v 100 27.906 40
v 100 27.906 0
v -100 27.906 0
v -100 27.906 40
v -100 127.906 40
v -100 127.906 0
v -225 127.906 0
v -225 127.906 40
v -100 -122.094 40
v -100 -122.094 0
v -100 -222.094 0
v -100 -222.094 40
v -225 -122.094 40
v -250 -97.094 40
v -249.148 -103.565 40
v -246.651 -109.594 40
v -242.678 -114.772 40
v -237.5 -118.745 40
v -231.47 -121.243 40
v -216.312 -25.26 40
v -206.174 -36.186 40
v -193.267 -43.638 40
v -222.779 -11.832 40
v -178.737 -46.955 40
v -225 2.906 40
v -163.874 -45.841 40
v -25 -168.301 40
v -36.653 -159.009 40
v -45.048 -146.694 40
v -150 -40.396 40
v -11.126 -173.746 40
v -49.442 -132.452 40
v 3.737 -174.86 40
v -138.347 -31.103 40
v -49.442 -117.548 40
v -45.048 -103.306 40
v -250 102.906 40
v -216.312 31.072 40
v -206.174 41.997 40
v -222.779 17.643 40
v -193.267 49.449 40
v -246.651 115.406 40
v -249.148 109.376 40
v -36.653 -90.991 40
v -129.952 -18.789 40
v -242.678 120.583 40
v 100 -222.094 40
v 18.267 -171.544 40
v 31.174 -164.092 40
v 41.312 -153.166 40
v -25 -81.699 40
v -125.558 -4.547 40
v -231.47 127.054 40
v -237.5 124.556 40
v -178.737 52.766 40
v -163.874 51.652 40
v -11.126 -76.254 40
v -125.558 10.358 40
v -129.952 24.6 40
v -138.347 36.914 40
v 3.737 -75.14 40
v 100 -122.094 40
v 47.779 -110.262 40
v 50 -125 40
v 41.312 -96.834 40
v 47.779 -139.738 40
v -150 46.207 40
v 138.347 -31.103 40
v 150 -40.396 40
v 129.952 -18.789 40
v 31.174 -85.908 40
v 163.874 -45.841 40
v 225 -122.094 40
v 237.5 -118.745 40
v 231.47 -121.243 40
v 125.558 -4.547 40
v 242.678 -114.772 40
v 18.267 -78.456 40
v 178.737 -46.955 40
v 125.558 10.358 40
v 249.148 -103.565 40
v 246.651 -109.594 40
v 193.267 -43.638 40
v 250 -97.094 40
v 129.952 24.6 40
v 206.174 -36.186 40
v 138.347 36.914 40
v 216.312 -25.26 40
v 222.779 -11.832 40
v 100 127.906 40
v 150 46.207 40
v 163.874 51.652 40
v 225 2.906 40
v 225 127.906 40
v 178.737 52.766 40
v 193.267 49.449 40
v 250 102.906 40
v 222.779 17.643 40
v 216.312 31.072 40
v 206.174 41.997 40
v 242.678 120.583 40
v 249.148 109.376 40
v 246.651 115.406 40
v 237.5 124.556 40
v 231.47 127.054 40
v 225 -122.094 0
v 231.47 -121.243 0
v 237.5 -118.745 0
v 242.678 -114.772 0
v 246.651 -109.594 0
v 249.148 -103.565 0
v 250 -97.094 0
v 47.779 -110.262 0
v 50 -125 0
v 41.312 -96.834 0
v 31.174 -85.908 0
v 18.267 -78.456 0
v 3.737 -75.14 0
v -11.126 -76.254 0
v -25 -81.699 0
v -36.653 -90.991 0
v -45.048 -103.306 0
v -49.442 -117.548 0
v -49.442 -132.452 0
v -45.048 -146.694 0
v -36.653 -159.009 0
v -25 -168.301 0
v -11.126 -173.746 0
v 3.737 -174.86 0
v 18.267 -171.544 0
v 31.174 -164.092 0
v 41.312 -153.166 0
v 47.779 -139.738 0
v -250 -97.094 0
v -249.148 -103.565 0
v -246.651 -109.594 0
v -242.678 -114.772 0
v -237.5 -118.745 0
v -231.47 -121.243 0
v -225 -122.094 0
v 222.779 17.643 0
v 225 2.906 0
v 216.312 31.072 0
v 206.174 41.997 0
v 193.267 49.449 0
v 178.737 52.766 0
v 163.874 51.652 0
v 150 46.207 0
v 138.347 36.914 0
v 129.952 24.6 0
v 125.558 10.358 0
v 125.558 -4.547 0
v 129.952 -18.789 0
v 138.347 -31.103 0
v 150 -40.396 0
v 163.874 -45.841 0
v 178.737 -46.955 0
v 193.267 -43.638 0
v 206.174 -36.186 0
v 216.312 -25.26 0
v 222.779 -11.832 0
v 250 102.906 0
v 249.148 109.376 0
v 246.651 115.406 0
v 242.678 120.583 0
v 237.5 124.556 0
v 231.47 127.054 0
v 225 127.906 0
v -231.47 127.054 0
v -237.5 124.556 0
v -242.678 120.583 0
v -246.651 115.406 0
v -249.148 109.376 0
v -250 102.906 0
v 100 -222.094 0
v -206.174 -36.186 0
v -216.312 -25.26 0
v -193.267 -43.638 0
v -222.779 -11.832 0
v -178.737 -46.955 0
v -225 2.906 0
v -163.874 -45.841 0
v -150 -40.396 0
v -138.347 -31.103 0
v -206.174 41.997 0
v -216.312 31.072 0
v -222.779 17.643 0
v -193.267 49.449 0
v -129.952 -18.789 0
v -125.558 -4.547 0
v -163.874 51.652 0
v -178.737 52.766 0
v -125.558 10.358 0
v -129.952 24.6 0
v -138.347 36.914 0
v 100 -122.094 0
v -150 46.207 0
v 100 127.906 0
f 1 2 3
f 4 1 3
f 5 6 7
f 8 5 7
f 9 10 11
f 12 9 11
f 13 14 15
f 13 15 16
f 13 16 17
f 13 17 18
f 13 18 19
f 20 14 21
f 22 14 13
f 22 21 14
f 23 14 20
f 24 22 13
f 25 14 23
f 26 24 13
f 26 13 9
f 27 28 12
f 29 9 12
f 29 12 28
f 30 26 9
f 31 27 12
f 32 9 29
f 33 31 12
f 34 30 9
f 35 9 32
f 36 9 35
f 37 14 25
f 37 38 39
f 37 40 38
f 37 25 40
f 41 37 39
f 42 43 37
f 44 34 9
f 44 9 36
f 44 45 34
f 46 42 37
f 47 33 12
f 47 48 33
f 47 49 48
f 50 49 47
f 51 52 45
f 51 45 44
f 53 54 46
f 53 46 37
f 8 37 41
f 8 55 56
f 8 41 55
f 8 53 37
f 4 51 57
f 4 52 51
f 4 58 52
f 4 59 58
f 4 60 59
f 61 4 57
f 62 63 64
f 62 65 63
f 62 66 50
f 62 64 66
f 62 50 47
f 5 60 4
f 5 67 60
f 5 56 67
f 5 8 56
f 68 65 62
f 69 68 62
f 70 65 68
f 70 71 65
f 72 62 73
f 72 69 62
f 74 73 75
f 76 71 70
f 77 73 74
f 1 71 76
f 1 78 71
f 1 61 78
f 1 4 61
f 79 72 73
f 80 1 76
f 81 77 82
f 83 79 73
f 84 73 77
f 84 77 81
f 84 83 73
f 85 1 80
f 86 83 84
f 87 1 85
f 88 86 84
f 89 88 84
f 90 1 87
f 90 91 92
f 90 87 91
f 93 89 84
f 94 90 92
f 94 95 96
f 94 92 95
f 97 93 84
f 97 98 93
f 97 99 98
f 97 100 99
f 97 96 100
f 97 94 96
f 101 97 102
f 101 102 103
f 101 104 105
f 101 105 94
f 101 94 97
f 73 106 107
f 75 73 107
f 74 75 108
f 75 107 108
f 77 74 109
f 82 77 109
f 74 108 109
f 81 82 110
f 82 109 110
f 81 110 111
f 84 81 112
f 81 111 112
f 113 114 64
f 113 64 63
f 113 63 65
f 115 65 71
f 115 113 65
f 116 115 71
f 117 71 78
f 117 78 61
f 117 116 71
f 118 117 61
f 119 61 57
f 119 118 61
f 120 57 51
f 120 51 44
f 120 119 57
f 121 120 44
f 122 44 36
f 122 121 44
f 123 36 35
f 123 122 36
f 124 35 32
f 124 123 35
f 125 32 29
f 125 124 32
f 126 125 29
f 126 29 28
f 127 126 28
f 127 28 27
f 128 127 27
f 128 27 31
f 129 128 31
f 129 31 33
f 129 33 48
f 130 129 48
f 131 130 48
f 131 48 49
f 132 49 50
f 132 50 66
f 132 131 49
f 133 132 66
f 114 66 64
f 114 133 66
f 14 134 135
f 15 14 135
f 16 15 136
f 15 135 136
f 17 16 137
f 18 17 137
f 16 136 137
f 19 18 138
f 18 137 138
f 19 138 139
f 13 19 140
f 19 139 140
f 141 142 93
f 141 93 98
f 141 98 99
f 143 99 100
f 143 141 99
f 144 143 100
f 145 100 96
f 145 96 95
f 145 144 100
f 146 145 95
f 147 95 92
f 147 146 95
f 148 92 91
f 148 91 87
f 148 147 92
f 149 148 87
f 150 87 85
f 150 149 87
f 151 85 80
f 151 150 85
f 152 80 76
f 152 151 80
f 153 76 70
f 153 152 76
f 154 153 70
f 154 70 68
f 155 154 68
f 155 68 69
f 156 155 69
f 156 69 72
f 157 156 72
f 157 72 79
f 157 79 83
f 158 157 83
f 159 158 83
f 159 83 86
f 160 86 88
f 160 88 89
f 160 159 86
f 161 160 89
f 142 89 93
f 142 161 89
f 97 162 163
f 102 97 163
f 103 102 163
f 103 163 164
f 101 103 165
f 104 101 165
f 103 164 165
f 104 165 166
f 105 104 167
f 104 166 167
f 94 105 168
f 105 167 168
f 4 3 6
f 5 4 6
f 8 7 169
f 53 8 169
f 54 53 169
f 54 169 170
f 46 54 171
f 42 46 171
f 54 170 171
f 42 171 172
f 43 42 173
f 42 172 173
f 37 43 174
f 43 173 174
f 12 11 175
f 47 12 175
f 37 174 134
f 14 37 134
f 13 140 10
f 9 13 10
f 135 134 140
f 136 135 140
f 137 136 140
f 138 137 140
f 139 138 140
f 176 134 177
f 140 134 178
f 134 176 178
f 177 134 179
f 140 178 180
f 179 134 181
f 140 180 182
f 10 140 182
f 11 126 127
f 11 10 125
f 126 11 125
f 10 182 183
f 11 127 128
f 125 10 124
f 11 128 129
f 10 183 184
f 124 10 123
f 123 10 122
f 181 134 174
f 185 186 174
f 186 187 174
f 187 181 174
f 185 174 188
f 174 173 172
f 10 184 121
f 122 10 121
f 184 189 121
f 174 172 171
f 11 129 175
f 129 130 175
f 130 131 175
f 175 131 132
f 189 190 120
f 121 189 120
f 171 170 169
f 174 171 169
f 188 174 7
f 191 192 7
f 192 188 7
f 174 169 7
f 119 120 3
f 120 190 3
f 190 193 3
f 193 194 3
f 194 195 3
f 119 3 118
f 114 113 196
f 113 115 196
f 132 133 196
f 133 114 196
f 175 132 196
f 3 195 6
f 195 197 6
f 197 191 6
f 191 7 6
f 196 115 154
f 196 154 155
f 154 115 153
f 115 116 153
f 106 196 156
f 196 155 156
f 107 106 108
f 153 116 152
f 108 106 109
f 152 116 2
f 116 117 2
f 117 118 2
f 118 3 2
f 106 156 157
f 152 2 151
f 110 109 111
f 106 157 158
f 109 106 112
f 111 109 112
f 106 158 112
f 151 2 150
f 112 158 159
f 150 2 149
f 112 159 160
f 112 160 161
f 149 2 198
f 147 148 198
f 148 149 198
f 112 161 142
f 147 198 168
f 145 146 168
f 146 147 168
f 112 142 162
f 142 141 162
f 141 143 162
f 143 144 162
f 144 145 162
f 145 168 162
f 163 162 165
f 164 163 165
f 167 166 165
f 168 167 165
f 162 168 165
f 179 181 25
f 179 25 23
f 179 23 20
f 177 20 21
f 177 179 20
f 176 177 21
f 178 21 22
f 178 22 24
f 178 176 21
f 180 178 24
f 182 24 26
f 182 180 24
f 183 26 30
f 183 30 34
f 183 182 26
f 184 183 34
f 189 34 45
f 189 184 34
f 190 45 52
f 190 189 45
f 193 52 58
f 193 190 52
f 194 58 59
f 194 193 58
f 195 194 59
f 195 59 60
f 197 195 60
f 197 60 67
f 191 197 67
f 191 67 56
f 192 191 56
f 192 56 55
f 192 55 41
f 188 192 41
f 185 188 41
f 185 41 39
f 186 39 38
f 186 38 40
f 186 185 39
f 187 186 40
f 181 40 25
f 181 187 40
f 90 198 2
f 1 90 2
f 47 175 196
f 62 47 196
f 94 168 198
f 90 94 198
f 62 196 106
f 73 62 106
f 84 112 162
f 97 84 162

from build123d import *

# Parameters (mm, degrees)
SKETCH1_R           = 50
BOSS_EXTRUDE1_DEPTH = 40


with BuildPart() as part:
    # Sketch1 → Boss-Extrude1 (new body)
    with BuildSketch(Plane.XY):
        with BuildLine():
            Line((-100, -122.09449171), (-100, -222.09449171))
            Line((-100, -222.09449171), (100, -222.09449171))
            Line((100, -222.09449171), (100, -122.09449171))
            Line((100, -122.09449171), (225, -122.09449171))
            ThreePointArc((225, -122.09449171), (242.67766953, -114.772161239), (250, -97.09449171))
            Line((250, -97.09449171), (250, 102.90550829))
            ThreePointArc((250, 102.90550829), (242.67766953, 120.58317782), (225, 127.90550829))
            Line((225, 127.90550829), (100, 127.90550829))
            Line((100, 127.90550829), (100, 27.90550829))
            Line((100, 27.90550829), (-100, 27.90550829))
            Line((-100, 27.90550829), (-100, 127.90550829))
            Line((-100, 127.90550829), (-225, 127.90550829))
            ThreePointArc((-225, 127.90550829), (-242.67766953, 120.58317782), (-250, 102.90550829))
            Line((-250, 102.90550829), (-250, -97.09449171))
            ThreePointArc((-250, -97.09449171), (-242.67766953, -114.772161239), (-225, -122.09449171))
            Line((-225, -122.09449171), (-100, -122.09449171))
        make_face()
        with Locations((0, -125)):
            Circle(SKETCH1_R, mode=Mode.SUBTRACT)
        with Locations((175, 2.90550829)):
            Circle(SKETCH1_R, mode=Mode.SUBTRACT)
        with Locations(Location((-175, 2.90550829, 0), (0, 0, 180))):
            Circle(SKETCH1_R, mode=Mode.SUBTRACT)
    extrude(amount=BOSS_EXTRUDE1_DEPTH)


solid = part.part
